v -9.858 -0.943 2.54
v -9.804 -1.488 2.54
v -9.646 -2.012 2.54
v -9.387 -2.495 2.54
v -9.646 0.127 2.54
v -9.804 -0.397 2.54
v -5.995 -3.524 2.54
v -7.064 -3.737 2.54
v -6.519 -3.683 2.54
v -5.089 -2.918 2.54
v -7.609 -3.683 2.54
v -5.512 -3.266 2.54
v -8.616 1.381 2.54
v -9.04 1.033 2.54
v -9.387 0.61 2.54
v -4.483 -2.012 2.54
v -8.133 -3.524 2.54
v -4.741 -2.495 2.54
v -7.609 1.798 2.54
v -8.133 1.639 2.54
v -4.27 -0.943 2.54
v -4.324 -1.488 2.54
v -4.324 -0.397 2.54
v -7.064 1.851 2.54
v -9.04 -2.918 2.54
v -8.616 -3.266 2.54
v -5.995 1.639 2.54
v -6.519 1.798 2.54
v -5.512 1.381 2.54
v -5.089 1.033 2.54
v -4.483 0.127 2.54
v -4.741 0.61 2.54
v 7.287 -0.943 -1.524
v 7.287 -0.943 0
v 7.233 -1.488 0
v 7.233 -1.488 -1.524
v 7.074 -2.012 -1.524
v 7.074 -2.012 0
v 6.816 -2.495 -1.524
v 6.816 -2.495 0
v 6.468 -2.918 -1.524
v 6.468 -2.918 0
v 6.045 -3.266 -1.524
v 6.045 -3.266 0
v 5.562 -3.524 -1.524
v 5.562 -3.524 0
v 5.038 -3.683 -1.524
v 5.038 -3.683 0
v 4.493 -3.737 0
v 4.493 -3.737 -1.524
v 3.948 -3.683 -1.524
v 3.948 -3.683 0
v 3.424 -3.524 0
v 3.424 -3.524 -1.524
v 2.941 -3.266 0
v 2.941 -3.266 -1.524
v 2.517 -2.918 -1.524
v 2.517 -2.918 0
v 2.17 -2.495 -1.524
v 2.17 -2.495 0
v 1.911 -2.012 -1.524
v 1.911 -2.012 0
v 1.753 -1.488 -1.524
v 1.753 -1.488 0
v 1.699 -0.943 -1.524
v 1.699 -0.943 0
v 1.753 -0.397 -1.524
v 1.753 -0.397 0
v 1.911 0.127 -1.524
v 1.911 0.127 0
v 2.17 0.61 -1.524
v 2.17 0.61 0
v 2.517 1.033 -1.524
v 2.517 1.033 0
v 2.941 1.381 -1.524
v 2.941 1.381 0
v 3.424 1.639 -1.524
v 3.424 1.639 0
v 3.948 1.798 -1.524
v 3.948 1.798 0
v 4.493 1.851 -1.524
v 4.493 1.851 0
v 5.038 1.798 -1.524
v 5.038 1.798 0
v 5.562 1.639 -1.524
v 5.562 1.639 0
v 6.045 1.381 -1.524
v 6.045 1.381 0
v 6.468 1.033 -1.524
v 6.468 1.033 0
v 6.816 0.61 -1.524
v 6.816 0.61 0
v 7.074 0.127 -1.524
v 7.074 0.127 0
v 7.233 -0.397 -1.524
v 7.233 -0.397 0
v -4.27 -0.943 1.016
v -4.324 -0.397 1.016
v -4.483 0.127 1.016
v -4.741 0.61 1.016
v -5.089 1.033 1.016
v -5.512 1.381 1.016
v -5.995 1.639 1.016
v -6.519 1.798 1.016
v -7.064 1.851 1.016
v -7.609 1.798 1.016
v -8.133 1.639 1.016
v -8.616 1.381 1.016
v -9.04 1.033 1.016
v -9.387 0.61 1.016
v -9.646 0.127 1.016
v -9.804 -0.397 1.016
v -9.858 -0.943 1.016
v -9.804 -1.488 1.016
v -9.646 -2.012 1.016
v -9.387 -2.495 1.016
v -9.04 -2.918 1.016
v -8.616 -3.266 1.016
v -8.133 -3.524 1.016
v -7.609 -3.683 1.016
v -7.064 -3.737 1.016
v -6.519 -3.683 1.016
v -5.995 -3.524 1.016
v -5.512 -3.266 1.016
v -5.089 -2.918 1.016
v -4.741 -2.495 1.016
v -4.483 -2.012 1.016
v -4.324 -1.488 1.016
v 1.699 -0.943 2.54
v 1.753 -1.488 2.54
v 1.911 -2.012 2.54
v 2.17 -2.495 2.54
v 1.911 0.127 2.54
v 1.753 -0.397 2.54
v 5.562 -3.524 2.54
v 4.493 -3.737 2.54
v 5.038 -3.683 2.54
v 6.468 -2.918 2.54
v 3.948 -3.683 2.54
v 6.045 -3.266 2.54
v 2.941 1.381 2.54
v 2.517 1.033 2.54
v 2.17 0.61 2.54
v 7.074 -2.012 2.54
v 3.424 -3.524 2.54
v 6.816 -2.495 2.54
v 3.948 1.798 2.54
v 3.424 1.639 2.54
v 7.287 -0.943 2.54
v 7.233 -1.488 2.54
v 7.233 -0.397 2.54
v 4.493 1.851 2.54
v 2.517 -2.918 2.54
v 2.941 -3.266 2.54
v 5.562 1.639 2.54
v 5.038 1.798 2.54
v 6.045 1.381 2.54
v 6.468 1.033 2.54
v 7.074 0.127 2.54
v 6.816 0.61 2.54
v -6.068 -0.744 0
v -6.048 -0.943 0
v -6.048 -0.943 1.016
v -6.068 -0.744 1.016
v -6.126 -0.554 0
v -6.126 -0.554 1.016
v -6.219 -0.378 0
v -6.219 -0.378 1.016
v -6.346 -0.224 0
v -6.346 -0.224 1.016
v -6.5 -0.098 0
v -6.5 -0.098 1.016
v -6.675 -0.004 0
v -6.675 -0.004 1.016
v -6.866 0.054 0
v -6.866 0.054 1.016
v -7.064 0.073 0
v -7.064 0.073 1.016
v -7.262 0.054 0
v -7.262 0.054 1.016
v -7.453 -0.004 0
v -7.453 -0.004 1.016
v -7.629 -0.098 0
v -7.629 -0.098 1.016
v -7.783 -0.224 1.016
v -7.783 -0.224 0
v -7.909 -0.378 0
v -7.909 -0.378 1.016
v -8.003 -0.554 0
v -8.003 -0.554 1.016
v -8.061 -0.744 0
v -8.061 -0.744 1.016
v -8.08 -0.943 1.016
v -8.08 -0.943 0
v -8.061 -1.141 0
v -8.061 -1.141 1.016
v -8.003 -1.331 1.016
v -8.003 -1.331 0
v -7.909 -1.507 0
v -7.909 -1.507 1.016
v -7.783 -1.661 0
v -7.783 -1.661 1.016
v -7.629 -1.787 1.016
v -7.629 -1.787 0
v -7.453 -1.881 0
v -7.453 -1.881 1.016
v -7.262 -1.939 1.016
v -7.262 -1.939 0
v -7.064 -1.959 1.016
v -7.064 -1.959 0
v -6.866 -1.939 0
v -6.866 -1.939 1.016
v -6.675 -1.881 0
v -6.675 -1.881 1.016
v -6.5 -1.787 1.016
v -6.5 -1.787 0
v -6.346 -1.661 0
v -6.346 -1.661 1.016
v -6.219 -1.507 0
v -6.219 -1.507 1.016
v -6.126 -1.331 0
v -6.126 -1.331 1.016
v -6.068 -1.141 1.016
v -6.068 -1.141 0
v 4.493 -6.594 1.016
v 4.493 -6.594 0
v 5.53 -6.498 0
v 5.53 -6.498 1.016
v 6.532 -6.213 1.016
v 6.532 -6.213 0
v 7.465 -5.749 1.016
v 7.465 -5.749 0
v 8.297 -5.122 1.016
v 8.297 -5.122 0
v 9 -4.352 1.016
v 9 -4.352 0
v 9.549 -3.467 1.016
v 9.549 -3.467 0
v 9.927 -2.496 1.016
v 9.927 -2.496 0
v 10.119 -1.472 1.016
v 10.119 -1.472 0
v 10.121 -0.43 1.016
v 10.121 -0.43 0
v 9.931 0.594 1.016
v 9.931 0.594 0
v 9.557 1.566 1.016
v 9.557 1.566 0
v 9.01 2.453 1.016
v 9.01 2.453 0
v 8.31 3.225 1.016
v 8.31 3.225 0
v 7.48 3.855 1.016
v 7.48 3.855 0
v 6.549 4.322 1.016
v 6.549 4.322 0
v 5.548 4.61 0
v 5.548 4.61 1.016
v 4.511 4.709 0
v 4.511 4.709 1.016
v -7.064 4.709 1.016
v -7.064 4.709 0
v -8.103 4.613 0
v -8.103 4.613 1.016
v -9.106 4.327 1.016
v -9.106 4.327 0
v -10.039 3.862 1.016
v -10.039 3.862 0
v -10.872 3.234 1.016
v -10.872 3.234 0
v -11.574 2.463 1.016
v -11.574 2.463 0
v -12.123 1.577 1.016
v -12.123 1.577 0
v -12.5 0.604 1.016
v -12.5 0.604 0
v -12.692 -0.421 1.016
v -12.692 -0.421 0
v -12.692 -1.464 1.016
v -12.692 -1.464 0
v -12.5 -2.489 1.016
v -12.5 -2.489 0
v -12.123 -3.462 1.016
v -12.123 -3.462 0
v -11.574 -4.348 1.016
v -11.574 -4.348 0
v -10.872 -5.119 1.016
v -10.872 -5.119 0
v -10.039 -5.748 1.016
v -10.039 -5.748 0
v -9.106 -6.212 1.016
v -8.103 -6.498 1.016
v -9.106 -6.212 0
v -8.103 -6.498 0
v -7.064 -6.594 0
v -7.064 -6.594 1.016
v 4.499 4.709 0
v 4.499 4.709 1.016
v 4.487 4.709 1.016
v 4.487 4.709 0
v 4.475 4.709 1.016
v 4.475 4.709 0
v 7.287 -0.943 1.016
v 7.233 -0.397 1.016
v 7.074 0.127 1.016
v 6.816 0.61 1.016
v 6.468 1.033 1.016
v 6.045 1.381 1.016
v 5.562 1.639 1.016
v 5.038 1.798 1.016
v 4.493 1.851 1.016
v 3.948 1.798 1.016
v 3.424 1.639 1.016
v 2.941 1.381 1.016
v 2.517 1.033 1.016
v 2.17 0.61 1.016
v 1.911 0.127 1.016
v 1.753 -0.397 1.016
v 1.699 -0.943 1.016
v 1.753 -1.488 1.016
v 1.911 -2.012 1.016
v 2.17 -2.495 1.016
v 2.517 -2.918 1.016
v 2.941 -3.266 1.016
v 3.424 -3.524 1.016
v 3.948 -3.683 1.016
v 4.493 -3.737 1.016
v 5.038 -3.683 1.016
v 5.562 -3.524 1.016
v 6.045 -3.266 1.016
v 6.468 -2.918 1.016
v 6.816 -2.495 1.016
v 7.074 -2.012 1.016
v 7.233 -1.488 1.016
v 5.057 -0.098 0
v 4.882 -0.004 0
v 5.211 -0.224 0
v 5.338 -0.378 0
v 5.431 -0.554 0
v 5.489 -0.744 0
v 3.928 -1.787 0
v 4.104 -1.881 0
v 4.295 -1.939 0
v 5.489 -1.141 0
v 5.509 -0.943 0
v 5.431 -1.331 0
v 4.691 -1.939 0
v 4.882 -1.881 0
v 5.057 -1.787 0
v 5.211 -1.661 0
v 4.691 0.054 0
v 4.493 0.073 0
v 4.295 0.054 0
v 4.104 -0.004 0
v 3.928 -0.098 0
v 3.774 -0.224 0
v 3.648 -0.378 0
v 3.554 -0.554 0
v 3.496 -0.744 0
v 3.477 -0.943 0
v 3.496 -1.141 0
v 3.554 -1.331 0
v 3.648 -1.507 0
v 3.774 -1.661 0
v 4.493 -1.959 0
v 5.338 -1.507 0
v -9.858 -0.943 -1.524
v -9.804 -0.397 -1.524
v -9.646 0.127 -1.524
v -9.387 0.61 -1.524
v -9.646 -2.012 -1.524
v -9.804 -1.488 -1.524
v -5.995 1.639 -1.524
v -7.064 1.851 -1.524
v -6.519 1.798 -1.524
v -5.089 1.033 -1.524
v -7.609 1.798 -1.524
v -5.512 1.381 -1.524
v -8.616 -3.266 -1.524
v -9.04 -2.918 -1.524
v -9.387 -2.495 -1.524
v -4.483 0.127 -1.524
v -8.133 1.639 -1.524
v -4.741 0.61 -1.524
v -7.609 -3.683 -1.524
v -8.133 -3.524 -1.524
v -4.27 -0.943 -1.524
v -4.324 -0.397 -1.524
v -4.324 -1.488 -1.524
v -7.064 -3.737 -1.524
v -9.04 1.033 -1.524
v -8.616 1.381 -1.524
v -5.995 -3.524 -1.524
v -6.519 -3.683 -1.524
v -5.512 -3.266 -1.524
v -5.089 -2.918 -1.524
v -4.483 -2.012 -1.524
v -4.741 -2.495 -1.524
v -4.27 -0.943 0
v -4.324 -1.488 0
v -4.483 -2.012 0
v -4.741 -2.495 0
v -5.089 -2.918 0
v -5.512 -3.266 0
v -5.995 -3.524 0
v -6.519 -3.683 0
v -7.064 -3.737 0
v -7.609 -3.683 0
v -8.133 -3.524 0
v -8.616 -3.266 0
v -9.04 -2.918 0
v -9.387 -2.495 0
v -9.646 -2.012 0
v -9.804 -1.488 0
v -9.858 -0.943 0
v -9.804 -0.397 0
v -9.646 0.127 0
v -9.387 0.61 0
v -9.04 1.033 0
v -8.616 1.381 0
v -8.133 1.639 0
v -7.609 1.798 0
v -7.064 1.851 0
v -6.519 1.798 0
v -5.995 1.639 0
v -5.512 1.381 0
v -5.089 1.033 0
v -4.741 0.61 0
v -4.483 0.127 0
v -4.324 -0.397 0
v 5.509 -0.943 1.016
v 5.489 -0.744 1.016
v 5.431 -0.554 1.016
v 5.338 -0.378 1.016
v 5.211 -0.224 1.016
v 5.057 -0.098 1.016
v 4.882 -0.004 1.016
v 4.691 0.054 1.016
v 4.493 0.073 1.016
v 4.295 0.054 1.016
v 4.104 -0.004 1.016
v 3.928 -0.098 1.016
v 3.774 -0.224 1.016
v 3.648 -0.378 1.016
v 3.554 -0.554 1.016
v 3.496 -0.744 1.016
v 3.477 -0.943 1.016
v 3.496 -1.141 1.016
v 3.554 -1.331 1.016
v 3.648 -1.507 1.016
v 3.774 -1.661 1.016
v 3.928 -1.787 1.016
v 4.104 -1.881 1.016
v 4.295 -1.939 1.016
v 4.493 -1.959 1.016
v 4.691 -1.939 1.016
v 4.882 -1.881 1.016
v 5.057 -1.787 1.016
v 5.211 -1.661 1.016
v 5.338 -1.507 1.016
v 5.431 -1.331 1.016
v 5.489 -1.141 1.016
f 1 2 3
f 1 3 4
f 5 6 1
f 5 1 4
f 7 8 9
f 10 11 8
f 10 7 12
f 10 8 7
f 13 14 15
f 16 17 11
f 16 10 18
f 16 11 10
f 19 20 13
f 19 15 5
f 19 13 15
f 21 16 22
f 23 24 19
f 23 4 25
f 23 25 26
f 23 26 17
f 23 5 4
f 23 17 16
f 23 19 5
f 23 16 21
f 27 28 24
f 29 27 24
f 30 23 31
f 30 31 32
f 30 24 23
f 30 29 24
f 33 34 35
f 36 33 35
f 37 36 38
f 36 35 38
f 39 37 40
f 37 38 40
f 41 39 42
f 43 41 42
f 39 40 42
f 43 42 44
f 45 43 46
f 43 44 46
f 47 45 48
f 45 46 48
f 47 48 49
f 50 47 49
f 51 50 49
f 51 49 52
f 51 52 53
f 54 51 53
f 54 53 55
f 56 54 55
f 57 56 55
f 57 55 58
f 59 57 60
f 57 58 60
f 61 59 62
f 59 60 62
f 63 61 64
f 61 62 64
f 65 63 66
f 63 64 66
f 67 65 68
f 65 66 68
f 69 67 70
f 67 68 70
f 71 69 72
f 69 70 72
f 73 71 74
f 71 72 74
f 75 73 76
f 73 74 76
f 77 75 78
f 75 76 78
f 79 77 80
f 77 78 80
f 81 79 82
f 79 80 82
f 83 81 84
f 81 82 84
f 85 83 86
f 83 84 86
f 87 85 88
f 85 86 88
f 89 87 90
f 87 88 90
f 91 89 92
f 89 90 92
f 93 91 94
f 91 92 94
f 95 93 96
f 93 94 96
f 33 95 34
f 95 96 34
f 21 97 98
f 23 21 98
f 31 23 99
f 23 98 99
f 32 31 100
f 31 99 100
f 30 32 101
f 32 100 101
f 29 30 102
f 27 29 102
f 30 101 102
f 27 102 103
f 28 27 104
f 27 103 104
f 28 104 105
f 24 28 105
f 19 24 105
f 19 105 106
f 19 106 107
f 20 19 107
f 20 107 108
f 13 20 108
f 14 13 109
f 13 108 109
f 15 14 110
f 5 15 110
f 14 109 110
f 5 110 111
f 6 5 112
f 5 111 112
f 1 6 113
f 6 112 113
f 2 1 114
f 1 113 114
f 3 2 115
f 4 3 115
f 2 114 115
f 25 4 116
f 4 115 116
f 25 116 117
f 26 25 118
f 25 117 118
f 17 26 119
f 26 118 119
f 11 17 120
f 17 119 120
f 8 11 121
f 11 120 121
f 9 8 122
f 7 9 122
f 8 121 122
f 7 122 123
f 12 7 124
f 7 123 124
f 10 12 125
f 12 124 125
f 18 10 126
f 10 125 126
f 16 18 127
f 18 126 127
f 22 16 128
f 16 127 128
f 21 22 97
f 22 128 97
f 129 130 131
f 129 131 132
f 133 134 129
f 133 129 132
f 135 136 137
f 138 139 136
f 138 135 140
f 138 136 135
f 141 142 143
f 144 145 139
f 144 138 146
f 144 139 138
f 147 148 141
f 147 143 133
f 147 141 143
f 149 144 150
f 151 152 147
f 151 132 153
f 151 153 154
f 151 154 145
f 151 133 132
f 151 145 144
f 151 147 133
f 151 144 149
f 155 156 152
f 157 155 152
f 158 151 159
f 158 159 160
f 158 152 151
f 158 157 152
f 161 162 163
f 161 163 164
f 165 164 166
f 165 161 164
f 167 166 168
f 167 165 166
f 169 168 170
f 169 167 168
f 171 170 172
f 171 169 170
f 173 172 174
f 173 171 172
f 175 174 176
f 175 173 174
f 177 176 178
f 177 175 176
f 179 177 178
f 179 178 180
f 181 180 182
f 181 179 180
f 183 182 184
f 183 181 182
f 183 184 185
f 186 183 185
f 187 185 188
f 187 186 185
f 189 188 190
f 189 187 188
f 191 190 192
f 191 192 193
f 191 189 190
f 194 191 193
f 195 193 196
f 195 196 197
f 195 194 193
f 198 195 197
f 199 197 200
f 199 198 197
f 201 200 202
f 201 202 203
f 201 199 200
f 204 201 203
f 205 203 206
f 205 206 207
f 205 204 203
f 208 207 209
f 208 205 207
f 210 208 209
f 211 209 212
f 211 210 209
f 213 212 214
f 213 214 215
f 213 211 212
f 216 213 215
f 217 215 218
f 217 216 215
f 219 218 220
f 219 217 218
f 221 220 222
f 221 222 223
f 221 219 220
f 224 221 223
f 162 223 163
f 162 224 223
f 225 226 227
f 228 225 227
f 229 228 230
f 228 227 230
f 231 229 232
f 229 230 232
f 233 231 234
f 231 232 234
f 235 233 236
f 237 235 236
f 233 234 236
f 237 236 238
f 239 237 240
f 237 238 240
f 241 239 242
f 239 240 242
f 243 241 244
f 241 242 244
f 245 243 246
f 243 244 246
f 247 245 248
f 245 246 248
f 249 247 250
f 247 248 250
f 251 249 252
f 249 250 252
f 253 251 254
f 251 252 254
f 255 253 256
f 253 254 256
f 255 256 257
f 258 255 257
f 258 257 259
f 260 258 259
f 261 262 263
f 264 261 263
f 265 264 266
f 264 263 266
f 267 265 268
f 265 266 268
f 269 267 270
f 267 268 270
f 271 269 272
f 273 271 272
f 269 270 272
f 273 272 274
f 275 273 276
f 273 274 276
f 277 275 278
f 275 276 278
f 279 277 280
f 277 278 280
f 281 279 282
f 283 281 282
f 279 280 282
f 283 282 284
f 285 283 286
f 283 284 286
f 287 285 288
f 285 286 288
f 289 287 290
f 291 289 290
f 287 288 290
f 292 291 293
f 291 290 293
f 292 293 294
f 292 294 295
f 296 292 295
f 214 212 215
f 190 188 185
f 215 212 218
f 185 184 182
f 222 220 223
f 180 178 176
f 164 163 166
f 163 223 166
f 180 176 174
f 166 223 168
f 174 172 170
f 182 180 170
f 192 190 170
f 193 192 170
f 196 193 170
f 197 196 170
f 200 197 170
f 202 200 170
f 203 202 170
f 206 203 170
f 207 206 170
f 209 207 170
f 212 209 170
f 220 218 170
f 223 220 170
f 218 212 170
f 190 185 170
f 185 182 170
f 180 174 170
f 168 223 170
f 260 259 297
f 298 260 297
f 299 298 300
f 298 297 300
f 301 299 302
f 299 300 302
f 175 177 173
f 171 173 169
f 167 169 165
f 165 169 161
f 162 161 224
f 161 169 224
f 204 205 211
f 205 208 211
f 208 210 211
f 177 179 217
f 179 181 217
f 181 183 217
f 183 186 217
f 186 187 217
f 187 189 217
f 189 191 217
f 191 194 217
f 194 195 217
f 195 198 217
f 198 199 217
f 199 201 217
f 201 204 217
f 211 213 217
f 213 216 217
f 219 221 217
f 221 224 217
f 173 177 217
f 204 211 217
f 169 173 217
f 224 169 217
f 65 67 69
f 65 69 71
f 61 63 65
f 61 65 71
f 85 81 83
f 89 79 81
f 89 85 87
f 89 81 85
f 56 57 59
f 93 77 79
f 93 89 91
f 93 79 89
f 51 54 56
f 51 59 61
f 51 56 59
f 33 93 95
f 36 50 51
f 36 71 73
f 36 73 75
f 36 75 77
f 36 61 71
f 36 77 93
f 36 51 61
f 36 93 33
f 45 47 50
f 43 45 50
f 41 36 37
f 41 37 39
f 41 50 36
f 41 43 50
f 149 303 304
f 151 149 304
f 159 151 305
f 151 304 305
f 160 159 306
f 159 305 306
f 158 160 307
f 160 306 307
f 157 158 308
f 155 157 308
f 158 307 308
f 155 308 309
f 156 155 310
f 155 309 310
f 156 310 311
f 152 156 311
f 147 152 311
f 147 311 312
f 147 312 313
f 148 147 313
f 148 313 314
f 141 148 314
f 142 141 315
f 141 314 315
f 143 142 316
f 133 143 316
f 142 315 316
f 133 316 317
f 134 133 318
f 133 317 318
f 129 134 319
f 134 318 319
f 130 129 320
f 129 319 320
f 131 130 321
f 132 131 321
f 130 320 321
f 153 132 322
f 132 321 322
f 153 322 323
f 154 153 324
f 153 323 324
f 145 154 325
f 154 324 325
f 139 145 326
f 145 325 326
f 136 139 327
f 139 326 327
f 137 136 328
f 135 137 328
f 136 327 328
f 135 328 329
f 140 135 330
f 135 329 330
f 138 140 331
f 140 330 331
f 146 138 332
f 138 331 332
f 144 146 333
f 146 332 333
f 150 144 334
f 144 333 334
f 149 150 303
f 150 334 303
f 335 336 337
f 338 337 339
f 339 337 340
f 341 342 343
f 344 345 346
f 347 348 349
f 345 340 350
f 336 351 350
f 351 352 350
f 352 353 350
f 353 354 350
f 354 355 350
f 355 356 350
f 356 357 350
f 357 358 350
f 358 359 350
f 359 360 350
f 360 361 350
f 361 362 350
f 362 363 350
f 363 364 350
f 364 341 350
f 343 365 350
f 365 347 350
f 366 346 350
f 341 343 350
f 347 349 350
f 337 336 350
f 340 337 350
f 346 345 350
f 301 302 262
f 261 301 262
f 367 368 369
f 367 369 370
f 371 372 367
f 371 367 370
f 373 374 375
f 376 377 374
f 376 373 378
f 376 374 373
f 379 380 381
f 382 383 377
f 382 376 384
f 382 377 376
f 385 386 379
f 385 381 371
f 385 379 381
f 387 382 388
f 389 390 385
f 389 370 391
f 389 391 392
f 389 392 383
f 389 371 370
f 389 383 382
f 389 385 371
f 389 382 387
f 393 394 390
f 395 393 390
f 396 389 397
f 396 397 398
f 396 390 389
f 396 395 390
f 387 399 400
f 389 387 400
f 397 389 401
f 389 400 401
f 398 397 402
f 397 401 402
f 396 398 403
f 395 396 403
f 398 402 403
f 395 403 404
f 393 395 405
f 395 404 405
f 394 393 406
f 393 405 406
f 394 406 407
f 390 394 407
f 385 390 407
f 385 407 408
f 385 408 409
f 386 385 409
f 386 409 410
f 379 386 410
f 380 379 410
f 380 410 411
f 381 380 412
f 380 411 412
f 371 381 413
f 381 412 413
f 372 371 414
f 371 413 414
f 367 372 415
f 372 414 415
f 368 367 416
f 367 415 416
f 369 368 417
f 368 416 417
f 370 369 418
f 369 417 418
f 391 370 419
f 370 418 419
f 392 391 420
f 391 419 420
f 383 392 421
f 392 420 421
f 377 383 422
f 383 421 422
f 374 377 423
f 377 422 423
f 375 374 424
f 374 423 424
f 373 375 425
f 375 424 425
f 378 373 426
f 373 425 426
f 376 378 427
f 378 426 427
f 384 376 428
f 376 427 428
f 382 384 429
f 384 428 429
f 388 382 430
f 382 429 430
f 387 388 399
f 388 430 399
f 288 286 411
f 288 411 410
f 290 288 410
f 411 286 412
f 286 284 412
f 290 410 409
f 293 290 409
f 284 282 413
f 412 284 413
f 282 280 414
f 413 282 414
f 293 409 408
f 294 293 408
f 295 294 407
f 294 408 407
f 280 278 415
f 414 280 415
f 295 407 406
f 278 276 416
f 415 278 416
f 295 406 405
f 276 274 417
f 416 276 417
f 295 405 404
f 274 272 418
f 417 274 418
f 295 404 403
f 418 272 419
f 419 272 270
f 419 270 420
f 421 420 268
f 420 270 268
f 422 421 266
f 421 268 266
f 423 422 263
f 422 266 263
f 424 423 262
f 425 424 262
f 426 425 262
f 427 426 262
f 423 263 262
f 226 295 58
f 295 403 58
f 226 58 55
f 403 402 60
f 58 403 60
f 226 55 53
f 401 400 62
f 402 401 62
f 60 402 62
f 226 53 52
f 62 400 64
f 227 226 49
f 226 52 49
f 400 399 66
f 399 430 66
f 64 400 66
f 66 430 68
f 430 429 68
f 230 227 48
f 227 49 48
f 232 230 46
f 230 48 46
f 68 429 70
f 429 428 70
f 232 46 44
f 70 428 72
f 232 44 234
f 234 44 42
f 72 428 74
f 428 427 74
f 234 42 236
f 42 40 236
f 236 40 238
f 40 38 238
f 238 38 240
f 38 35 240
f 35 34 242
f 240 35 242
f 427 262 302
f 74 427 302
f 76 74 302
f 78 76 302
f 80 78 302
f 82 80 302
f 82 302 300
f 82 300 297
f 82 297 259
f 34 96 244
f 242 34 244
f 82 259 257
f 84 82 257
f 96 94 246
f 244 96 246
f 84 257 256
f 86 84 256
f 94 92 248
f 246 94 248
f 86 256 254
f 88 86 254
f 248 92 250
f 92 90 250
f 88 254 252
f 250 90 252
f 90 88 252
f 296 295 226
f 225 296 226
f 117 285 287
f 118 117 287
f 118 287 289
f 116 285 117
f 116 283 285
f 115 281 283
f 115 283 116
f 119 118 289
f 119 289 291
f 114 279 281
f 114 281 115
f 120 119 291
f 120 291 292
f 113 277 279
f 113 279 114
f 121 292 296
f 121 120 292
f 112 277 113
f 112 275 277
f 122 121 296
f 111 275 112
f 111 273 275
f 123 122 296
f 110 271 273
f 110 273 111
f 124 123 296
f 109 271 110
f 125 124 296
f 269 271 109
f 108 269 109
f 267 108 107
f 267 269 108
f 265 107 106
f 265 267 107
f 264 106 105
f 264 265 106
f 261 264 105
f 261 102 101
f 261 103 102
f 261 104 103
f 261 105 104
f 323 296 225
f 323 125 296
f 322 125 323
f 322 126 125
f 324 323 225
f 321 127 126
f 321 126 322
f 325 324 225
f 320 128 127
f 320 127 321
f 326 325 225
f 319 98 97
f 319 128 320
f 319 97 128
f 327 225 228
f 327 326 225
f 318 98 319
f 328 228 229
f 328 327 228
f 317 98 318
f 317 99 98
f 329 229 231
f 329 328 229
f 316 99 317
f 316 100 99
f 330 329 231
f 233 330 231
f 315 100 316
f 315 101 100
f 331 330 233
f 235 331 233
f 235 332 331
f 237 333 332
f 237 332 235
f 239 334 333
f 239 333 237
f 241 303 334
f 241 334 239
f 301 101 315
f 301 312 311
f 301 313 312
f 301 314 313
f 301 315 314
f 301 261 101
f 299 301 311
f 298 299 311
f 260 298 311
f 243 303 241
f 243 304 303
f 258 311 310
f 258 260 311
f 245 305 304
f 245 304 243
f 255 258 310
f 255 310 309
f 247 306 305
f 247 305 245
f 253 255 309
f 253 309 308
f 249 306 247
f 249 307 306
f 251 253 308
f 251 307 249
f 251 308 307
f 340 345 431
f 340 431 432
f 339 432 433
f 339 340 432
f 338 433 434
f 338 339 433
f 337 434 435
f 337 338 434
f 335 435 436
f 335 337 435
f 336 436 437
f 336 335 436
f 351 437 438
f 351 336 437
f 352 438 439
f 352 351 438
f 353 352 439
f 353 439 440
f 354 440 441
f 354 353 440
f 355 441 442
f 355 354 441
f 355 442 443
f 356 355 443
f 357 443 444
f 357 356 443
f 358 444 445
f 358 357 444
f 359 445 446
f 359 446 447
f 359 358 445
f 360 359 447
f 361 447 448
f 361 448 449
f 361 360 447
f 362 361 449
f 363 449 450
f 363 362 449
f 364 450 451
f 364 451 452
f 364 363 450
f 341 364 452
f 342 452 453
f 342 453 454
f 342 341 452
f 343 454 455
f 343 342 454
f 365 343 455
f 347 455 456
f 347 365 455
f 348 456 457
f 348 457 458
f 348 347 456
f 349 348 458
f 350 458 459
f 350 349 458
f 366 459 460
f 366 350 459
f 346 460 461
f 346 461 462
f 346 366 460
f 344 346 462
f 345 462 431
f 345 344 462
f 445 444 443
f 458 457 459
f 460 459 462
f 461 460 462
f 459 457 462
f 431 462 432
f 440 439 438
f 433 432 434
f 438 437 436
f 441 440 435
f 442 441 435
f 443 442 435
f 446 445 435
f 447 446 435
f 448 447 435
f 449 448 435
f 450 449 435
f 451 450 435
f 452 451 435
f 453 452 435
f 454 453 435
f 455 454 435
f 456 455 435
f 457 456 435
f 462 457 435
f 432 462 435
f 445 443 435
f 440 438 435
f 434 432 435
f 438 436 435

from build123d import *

# Parameters (mm, degrees)
F0_R     = 1.016
F1_DEPTH = 1.016
F2_R     = 2.794
F3_DEPTH = 1.524
F4_R     = 2.794
F5_DEPTH = 1.524


with BuildPart() as f1:
    # F0 (on Top) → F1 (new body)
    with BuildSketch(Plane.XY):
        with BuildLine():
            Line((-7.064182, -6.594037), (4.492818, -6.594037))
            ThreePointArc((4.492818, -6.594037), (10.144311, -0.951402), (4.510547, 4.708935))
            ThreePointArc((4.510547, 4.708935), (4.492832, 4.708963), (4.475116, 4.708935))
            Line((4.475116, 4.708935), (-7.064182, 4.708963))
            ThreePointArc((-7.064182, 4.708963), (-12.715682, -0.942537), (-7.064182, -6.594037))
        make_face()
        with Locations((-7.064182, -0.942537)):
            Circle(F0_R, mode=Mode.SUBTRACT)
        with Locations((4.492818, -0.942537)):
            Circle(F0_R, mode=Mode.SUBTRACT)
    extrude(amount=F1_DEPTH)

    # F2 (on face) → F3 (join)
    with BuildSketch(Plane.XY.offset(1.016)):
        with Locations((4.492818, -0.942537)):
            Circle(F2_R)
        with Locations((-7.064182, -0.942537)):
            Circle(F2_R)
    extrude(amount=F3_DEPTH)

    # F4 (on face) → F5 (join)
    with BuildSketch(Plane(origin=(0, 0, 0), x_dir=(1, 0, 0), z_dir=(0, 0, -1))):
        with Locations((4.492818, 0.942537)):
            Circle(F4_R)
        with Locations((-7.064182, 0.942537)):
            Circle(F4_R)
    extrude(amount=F5_DEPTH)


solid = f1.part
